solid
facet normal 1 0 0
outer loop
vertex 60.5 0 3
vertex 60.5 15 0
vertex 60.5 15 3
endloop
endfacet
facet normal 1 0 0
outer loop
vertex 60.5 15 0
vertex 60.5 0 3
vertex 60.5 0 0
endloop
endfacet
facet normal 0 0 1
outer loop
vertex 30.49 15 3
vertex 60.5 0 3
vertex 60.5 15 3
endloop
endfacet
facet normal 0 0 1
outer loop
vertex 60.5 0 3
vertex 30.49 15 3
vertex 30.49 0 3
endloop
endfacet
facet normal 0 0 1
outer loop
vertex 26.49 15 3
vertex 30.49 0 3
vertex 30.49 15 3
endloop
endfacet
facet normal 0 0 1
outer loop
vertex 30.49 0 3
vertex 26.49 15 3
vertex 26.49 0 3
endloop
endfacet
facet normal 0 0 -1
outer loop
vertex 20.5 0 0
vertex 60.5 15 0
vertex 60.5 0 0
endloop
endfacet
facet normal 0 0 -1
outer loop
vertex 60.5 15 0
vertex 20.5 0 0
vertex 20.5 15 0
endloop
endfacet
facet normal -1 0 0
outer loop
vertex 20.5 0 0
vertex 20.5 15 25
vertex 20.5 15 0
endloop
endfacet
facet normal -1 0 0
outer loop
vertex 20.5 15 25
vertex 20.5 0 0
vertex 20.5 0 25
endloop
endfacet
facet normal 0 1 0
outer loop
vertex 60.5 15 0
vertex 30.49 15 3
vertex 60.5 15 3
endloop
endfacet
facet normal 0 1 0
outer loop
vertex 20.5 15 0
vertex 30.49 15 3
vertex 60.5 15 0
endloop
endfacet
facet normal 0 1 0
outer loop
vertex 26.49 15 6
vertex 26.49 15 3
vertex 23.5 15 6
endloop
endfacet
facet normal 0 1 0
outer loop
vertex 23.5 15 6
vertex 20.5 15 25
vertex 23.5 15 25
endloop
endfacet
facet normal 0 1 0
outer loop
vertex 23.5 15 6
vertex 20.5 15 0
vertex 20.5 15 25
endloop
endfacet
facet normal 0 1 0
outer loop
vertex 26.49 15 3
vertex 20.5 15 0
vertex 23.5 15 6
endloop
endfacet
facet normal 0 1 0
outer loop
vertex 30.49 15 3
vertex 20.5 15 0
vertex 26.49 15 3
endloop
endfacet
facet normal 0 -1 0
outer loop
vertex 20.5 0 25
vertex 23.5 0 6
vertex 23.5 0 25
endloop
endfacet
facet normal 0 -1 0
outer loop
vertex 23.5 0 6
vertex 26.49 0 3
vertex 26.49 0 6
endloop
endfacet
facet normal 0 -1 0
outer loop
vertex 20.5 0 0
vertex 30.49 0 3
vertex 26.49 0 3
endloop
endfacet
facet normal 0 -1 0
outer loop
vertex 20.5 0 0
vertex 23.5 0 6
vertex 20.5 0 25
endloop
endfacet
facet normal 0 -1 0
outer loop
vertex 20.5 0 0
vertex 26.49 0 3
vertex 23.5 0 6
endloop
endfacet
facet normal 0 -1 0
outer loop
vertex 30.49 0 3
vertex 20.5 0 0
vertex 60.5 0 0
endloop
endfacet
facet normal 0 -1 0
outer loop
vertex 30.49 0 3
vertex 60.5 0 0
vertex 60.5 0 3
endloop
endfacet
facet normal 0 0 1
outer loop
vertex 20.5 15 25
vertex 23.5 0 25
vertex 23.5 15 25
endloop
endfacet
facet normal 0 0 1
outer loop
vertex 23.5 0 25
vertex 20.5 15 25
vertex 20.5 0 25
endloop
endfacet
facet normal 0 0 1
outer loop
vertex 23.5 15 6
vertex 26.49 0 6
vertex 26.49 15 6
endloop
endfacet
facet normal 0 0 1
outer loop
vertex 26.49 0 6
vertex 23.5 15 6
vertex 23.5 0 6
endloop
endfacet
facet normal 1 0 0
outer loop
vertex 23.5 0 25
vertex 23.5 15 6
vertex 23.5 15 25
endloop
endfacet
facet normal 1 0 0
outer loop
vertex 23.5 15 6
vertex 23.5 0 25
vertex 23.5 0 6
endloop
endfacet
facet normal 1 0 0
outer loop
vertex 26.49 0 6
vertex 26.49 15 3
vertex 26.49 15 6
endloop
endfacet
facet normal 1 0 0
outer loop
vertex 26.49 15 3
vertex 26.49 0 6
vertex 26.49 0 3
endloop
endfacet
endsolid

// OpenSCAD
difference(){
union(){
    #translate ([20.5,0,0])cube ([40,15,3]);
    translate ([20.5,0,0]) cube ([9,15,25]);
}
union(){
    translate ([23.5,-.1,6]) cube ([3,16,26]);
    translate ([26.49,-.1,3]) cube ([4,17,26]);
}}
